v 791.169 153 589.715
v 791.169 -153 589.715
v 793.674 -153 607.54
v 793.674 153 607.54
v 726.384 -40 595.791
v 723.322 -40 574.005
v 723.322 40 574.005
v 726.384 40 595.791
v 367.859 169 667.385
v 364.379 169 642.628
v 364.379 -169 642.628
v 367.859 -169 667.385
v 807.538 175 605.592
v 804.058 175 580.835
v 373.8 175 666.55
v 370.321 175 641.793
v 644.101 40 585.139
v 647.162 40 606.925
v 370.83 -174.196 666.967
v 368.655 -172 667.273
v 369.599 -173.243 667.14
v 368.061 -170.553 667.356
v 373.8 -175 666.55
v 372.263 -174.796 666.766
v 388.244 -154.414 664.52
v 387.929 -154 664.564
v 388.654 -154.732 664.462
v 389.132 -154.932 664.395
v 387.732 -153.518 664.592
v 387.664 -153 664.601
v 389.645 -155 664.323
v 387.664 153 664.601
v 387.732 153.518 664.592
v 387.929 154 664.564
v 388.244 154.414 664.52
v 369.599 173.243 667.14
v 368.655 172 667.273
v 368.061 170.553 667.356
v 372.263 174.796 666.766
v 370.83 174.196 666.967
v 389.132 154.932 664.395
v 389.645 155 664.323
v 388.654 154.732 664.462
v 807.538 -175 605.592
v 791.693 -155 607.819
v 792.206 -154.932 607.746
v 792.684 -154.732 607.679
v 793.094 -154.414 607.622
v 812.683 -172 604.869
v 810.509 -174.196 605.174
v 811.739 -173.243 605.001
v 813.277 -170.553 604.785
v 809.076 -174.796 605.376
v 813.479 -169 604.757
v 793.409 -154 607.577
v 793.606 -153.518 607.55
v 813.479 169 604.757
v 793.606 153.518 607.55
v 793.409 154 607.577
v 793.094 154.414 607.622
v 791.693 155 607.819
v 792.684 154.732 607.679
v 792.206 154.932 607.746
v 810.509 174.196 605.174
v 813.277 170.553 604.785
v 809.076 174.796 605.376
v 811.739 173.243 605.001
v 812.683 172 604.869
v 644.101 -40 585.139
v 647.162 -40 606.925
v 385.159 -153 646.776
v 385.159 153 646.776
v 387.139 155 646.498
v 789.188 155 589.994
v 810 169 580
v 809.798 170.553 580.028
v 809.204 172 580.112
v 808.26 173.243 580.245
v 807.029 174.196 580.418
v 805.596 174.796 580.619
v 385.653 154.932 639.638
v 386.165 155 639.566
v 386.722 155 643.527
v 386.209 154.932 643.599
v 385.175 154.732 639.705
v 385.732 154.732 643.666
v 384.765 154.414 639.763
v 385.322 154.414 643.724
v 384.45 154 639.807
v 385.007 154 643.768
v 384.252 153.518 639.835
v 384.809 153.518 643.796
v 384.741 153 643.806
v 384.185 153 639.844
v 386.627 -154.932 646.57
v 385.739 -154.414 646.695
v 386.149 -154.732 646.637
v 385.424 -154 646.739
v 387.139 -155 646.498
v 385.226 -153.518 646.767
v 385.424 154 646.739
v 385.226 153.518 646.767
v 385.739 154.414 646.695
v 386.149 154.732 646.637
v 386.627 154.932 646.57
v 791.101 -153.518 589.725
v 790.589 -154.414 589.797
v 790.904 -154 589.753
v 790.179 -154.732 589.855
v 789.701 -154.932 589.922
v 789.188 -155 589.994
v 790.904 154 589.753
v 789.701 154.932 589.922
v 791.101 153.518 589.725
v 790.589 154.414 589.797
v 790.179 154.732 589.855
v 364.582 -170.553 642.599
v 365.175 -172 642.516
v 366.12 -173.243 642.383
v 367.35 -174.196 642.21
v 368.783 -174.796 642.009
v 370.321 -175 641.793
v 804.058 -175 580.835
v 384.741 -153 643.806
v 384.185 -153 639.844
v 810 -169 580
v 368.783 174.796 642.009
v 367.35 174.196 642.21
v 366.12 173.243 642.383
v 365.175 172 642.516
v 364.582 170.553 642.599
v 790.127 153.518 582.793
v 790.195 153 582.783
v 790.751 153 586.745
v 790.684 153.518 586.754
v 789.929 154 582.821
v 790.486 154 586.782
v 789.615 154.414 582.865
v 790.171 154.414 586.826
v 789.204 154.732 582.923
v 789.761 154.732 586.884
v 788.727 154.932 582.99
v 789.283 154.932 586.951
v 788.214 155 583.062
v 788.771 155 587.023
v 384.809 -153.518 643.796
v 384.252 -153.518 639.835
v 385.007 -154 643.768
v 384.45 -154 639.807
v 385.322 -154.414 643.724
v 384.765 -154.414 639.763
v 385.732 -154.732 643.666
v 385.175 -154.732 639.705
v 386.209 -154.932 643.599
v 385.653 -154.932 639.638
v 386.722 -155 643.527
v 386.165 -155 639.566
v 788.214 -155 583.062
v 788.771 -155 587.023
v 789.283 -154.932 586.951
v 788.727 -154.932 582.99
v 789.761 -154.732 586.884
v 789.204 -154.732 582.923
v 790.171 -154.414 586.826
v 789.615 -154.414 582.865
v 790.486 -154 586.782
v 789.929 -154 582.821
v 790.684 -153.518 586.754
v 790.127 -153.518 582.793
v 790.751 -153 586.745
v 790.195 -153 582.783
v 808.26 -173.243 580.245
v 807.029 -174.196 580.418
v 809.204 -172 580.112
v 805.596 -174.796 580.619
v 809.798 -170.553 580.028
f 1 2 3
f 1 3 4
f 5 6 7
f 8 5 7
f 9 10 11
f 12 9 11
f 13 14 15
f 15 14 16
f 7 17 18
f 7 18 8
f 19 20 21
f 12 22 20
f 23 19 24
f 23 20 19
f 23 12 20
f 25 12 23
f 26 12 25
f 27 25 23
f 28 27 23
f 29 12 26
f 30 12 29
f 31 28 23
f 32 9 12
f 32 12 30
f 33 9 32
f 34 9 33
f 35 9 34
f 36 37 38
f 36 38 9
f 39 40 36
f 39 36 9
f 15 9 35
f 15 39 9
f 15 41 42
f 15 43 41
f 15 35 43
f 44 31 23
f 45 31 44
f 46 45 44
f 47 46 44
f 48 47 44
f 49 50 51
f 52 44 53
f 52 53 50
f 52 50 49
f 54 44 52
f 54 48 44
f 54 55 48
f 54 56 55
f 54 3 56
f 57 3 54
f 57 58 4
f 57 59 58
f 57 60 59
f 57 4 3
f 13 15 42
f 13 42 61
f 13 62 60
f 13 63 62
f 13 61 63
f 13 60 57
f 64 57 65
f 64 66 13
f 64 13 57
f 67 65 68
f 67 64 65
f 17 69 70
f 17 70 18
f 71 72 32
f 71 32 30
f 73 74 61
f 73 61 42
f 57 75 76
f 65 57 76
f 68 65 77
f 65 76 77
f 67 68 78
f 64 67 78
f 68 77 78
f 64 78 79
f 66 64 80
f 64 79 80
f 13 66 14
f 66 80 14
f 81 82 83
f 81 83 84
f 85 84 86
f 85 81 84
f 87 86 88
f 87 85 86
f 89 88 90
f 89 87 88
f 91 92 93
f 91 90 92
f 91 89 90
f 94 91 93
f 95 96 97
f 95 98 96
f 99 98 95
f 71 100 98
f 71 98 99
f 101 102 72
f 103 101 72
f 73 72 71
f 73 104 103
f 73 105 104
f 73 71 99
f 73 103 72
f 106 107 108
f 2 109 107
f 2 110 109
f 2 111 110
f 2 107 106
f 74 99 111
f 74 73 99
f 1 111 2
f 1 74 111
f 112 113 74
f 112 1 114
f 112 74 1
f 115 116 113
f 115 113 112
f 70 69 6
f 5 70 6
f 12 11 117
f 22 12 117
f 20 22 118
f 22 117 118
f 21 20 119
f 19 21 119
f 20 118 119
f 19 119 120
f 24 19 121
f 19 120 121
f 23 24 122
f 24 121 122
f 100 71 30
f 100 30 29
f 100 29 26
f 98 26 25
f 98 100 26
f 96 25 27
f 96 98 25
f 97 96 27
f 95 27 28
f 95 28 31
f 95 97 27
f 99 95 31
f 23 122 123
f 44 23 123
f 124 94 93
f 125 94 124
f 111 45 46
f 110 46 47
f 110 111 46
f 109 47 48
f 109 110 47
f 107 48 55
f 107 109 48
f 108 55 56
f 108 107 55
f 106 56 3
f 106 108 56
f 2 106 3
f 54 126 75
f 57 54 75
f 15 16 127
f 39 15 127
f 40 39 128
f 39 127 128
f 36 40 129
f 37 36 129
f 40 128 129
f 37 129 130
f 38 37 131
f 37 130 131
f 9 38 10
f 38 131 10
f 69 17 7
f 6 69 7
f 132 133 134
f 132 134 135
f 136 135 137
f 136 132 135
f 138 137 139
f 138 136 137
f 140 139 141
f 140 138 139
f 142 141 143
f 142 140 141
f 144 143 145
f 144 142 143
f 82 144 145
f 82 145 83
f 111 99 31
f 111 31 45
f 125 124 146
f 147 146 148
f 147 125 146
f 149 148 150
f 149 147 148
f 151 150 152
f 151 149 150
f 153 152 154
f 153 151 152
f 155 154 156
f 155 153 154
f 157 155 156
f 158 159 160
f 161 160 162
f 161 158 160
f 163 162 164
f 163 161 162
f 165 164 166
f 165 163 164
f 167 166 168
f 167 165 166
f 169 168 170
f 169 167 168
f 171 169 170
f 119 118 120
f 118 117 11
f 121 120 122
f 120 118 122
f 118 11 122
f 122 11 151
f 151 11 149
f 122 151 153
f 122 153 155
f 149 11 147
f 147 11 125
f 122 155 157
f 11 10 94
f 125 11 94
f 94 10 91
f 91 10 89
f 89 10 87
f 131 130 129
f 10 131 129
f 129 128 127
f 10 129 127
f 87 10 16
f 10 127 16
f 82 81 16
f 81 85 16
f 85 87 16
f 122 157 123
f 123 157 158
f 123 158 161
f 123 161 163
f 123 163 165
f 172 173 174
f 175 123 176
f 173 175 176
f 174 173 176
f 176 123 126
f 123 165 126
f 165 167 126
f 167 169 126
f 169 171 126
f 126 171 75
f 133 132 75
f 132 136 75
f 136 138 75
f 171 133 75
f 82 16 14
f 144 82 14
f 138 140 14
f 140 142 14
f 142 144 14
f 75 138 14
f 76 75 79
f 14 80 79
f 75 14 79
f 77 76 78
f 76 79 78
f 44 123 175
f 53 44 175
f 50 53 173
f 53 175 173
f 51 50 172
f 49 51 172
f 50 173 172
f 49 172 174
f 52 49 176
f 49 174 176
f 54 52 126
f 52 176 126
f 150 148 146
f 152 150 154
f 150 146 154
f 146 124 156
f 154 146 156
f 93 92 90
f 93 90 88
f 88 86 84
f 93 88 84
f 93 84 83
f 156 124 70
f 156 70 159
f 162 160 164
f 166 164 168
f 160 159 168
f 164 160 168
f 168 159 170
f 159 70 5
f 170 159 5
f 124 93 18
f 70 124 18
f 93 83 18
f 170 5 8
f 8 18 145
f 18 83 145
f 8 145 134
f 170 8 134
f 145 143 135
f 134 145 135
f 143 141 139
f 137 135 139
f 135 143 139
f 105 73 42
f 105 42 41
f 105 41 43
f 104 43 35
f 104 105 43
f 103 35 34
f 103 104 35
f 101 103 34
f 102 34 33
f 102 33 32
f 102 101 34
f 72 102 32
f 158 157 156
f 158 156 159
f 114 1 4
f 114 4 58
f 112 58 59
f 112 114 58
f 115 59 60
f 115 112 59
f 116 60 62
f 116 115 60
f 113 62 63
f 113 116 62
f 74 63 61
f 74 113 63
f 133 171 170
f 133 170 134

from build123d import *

# Parameters (mm, degrees)
EXTRUDE_START          = -12.5
EXTRUDE_1_DEPTH        = 25
EXTRUDE_ROTATE_1_ANGLE = 8
EXTRUDE_START_2        = -8.5
EXTRUDE_SKETCH_2_W     = 410
EXTRUDE_SKETCH_2_H     = 310
EXTRUDE_2_DEPTH        = 3
EXTRUDE_ROTATE_2_ANGLE = 8
EXTRUDE_START_3        = -30.5
EXTRUDE_SKETCH_3_W     = 80
EXTRUDE_SKETCH_3_H     = 80
EXTRUDE_3_DEPTH        = 22
EXTRUDE_ROTATE_3_ANGLE = 8


with BuildPart() as part:
    # Extrude sketch 1 → Extrude 1 (new body)
    with BuildSketch(Plane.XY.offset(EXTRUDE_START)):
        with BuildLine():
            Line((219, 175), (-219, 175))
            ThreePointArc((-219, 175), (-223.242640687, 173.242640687), (-225, 169))
            Line((-225, 169), (-225, -169))
            ThreePointArc((-225, -169), (-223.242640687, -173.242640687), (-219, -175))
            Line((-219, -175), (219, -175))
            ThreePointArc((219, -175), (223.242640687, -173.242640687), (225, -169))
            Line((225, -169), (225, 169))
            ThreePointArc((225, 169), (223.242640687, 173.242640687), (219, 175))
        make_face()
        with BuildLine():
            Line((203, 155), (-203, 155))
            ThreePointArc((-203, 155), (-204.414213562, 154.414213562), (-205, 153))
            Line((-205, 153), (-205, -153))
            ThreePointArc((-205, -153), (-204.414213562, -154.414213562), (-203, -155))
            Line((-203, -155), (203, -155))
            ThreePointArc((203, -155), (204.414213562, -154.414213562), (205, -153))
            Line((205, -153), (205, 153))
            ThreePointArc((205, 153), (204.414213562, 154.414213562), (203, 155))
        make_face(mode=Mode.SUBTRACT)
    extrude(amount=EXTRUDE_1_DEPTH)


with BuildPart() as part_1:
    # Extrude rotate 1: moved
    add(part.part.rotate(Axis((0, 0, 0), (0, 1, 0)), EXTRUDE_ROTATE_1_ANGLE))


with BuildPart() as part_2:
    # Extrude place 1: moved
    add(part_1.part.moved(Location((588.929348295, 0, 623.692298575))))


with BuildPart() as body_2:
    # Extrude sketch 2 → Extrude 2 (new body)
    with BuildSketch(Plane.XY.offset(EXTRUDE_START_2)):
        Rectangle(EXTRUDE_SKETCH_2_W, EXTRUDE_SKETCH_2_H)
    extrude(amount=EXTRUDE_2_DEPTH)


with BuildPart() as body_2_1:
    # Extrude rotate 2: moved
    add(body_2.part.rotate(Axis((0, 0, 0), (0, 1, 0)), EXTRUDE_ROTATE_2_ANGLE))


with BuildPart() as body_2_2:
    # Extrude place 2: moved
    add(body_2_1.part.moved(Location((588.929348295, 0, 623.692298575))))


with BuildPart() as body_3:
    # Extrude sketch 3 → Extrude 3 (new body)
    with BuildSketch(Plane.XY.offset(EXTRUDE_START_3)):
        with Locations((100, 0)):
            Rectangle(EXTRUDE_SKETCH_3_W, EXTRUDE_SKETCH_3_H)
    extrude(amount=EXTRUDE_3_DEPTH)


with BuildPart() as body_3_1:
    # Extrude rotate 3: moved
    add(body_3.part.rotate(Axis((0, 0, 0), (0, 1, 0)), EXTRUDE_ROTATE_3_ANGLE))


with BuildPart() as body_3_2:
    # Extrude place 3: moved
    add(body_3_1.part.moved(Location((588.929348295, 0, 623.692298575))))


with BuildPart() as part_3:
    add(part_2.part)

    # Combine (weld / assembly of features): union body 3, body 2
    add(body_3_2.part)
    add(body_2_2.part)


solid = part_3.part
